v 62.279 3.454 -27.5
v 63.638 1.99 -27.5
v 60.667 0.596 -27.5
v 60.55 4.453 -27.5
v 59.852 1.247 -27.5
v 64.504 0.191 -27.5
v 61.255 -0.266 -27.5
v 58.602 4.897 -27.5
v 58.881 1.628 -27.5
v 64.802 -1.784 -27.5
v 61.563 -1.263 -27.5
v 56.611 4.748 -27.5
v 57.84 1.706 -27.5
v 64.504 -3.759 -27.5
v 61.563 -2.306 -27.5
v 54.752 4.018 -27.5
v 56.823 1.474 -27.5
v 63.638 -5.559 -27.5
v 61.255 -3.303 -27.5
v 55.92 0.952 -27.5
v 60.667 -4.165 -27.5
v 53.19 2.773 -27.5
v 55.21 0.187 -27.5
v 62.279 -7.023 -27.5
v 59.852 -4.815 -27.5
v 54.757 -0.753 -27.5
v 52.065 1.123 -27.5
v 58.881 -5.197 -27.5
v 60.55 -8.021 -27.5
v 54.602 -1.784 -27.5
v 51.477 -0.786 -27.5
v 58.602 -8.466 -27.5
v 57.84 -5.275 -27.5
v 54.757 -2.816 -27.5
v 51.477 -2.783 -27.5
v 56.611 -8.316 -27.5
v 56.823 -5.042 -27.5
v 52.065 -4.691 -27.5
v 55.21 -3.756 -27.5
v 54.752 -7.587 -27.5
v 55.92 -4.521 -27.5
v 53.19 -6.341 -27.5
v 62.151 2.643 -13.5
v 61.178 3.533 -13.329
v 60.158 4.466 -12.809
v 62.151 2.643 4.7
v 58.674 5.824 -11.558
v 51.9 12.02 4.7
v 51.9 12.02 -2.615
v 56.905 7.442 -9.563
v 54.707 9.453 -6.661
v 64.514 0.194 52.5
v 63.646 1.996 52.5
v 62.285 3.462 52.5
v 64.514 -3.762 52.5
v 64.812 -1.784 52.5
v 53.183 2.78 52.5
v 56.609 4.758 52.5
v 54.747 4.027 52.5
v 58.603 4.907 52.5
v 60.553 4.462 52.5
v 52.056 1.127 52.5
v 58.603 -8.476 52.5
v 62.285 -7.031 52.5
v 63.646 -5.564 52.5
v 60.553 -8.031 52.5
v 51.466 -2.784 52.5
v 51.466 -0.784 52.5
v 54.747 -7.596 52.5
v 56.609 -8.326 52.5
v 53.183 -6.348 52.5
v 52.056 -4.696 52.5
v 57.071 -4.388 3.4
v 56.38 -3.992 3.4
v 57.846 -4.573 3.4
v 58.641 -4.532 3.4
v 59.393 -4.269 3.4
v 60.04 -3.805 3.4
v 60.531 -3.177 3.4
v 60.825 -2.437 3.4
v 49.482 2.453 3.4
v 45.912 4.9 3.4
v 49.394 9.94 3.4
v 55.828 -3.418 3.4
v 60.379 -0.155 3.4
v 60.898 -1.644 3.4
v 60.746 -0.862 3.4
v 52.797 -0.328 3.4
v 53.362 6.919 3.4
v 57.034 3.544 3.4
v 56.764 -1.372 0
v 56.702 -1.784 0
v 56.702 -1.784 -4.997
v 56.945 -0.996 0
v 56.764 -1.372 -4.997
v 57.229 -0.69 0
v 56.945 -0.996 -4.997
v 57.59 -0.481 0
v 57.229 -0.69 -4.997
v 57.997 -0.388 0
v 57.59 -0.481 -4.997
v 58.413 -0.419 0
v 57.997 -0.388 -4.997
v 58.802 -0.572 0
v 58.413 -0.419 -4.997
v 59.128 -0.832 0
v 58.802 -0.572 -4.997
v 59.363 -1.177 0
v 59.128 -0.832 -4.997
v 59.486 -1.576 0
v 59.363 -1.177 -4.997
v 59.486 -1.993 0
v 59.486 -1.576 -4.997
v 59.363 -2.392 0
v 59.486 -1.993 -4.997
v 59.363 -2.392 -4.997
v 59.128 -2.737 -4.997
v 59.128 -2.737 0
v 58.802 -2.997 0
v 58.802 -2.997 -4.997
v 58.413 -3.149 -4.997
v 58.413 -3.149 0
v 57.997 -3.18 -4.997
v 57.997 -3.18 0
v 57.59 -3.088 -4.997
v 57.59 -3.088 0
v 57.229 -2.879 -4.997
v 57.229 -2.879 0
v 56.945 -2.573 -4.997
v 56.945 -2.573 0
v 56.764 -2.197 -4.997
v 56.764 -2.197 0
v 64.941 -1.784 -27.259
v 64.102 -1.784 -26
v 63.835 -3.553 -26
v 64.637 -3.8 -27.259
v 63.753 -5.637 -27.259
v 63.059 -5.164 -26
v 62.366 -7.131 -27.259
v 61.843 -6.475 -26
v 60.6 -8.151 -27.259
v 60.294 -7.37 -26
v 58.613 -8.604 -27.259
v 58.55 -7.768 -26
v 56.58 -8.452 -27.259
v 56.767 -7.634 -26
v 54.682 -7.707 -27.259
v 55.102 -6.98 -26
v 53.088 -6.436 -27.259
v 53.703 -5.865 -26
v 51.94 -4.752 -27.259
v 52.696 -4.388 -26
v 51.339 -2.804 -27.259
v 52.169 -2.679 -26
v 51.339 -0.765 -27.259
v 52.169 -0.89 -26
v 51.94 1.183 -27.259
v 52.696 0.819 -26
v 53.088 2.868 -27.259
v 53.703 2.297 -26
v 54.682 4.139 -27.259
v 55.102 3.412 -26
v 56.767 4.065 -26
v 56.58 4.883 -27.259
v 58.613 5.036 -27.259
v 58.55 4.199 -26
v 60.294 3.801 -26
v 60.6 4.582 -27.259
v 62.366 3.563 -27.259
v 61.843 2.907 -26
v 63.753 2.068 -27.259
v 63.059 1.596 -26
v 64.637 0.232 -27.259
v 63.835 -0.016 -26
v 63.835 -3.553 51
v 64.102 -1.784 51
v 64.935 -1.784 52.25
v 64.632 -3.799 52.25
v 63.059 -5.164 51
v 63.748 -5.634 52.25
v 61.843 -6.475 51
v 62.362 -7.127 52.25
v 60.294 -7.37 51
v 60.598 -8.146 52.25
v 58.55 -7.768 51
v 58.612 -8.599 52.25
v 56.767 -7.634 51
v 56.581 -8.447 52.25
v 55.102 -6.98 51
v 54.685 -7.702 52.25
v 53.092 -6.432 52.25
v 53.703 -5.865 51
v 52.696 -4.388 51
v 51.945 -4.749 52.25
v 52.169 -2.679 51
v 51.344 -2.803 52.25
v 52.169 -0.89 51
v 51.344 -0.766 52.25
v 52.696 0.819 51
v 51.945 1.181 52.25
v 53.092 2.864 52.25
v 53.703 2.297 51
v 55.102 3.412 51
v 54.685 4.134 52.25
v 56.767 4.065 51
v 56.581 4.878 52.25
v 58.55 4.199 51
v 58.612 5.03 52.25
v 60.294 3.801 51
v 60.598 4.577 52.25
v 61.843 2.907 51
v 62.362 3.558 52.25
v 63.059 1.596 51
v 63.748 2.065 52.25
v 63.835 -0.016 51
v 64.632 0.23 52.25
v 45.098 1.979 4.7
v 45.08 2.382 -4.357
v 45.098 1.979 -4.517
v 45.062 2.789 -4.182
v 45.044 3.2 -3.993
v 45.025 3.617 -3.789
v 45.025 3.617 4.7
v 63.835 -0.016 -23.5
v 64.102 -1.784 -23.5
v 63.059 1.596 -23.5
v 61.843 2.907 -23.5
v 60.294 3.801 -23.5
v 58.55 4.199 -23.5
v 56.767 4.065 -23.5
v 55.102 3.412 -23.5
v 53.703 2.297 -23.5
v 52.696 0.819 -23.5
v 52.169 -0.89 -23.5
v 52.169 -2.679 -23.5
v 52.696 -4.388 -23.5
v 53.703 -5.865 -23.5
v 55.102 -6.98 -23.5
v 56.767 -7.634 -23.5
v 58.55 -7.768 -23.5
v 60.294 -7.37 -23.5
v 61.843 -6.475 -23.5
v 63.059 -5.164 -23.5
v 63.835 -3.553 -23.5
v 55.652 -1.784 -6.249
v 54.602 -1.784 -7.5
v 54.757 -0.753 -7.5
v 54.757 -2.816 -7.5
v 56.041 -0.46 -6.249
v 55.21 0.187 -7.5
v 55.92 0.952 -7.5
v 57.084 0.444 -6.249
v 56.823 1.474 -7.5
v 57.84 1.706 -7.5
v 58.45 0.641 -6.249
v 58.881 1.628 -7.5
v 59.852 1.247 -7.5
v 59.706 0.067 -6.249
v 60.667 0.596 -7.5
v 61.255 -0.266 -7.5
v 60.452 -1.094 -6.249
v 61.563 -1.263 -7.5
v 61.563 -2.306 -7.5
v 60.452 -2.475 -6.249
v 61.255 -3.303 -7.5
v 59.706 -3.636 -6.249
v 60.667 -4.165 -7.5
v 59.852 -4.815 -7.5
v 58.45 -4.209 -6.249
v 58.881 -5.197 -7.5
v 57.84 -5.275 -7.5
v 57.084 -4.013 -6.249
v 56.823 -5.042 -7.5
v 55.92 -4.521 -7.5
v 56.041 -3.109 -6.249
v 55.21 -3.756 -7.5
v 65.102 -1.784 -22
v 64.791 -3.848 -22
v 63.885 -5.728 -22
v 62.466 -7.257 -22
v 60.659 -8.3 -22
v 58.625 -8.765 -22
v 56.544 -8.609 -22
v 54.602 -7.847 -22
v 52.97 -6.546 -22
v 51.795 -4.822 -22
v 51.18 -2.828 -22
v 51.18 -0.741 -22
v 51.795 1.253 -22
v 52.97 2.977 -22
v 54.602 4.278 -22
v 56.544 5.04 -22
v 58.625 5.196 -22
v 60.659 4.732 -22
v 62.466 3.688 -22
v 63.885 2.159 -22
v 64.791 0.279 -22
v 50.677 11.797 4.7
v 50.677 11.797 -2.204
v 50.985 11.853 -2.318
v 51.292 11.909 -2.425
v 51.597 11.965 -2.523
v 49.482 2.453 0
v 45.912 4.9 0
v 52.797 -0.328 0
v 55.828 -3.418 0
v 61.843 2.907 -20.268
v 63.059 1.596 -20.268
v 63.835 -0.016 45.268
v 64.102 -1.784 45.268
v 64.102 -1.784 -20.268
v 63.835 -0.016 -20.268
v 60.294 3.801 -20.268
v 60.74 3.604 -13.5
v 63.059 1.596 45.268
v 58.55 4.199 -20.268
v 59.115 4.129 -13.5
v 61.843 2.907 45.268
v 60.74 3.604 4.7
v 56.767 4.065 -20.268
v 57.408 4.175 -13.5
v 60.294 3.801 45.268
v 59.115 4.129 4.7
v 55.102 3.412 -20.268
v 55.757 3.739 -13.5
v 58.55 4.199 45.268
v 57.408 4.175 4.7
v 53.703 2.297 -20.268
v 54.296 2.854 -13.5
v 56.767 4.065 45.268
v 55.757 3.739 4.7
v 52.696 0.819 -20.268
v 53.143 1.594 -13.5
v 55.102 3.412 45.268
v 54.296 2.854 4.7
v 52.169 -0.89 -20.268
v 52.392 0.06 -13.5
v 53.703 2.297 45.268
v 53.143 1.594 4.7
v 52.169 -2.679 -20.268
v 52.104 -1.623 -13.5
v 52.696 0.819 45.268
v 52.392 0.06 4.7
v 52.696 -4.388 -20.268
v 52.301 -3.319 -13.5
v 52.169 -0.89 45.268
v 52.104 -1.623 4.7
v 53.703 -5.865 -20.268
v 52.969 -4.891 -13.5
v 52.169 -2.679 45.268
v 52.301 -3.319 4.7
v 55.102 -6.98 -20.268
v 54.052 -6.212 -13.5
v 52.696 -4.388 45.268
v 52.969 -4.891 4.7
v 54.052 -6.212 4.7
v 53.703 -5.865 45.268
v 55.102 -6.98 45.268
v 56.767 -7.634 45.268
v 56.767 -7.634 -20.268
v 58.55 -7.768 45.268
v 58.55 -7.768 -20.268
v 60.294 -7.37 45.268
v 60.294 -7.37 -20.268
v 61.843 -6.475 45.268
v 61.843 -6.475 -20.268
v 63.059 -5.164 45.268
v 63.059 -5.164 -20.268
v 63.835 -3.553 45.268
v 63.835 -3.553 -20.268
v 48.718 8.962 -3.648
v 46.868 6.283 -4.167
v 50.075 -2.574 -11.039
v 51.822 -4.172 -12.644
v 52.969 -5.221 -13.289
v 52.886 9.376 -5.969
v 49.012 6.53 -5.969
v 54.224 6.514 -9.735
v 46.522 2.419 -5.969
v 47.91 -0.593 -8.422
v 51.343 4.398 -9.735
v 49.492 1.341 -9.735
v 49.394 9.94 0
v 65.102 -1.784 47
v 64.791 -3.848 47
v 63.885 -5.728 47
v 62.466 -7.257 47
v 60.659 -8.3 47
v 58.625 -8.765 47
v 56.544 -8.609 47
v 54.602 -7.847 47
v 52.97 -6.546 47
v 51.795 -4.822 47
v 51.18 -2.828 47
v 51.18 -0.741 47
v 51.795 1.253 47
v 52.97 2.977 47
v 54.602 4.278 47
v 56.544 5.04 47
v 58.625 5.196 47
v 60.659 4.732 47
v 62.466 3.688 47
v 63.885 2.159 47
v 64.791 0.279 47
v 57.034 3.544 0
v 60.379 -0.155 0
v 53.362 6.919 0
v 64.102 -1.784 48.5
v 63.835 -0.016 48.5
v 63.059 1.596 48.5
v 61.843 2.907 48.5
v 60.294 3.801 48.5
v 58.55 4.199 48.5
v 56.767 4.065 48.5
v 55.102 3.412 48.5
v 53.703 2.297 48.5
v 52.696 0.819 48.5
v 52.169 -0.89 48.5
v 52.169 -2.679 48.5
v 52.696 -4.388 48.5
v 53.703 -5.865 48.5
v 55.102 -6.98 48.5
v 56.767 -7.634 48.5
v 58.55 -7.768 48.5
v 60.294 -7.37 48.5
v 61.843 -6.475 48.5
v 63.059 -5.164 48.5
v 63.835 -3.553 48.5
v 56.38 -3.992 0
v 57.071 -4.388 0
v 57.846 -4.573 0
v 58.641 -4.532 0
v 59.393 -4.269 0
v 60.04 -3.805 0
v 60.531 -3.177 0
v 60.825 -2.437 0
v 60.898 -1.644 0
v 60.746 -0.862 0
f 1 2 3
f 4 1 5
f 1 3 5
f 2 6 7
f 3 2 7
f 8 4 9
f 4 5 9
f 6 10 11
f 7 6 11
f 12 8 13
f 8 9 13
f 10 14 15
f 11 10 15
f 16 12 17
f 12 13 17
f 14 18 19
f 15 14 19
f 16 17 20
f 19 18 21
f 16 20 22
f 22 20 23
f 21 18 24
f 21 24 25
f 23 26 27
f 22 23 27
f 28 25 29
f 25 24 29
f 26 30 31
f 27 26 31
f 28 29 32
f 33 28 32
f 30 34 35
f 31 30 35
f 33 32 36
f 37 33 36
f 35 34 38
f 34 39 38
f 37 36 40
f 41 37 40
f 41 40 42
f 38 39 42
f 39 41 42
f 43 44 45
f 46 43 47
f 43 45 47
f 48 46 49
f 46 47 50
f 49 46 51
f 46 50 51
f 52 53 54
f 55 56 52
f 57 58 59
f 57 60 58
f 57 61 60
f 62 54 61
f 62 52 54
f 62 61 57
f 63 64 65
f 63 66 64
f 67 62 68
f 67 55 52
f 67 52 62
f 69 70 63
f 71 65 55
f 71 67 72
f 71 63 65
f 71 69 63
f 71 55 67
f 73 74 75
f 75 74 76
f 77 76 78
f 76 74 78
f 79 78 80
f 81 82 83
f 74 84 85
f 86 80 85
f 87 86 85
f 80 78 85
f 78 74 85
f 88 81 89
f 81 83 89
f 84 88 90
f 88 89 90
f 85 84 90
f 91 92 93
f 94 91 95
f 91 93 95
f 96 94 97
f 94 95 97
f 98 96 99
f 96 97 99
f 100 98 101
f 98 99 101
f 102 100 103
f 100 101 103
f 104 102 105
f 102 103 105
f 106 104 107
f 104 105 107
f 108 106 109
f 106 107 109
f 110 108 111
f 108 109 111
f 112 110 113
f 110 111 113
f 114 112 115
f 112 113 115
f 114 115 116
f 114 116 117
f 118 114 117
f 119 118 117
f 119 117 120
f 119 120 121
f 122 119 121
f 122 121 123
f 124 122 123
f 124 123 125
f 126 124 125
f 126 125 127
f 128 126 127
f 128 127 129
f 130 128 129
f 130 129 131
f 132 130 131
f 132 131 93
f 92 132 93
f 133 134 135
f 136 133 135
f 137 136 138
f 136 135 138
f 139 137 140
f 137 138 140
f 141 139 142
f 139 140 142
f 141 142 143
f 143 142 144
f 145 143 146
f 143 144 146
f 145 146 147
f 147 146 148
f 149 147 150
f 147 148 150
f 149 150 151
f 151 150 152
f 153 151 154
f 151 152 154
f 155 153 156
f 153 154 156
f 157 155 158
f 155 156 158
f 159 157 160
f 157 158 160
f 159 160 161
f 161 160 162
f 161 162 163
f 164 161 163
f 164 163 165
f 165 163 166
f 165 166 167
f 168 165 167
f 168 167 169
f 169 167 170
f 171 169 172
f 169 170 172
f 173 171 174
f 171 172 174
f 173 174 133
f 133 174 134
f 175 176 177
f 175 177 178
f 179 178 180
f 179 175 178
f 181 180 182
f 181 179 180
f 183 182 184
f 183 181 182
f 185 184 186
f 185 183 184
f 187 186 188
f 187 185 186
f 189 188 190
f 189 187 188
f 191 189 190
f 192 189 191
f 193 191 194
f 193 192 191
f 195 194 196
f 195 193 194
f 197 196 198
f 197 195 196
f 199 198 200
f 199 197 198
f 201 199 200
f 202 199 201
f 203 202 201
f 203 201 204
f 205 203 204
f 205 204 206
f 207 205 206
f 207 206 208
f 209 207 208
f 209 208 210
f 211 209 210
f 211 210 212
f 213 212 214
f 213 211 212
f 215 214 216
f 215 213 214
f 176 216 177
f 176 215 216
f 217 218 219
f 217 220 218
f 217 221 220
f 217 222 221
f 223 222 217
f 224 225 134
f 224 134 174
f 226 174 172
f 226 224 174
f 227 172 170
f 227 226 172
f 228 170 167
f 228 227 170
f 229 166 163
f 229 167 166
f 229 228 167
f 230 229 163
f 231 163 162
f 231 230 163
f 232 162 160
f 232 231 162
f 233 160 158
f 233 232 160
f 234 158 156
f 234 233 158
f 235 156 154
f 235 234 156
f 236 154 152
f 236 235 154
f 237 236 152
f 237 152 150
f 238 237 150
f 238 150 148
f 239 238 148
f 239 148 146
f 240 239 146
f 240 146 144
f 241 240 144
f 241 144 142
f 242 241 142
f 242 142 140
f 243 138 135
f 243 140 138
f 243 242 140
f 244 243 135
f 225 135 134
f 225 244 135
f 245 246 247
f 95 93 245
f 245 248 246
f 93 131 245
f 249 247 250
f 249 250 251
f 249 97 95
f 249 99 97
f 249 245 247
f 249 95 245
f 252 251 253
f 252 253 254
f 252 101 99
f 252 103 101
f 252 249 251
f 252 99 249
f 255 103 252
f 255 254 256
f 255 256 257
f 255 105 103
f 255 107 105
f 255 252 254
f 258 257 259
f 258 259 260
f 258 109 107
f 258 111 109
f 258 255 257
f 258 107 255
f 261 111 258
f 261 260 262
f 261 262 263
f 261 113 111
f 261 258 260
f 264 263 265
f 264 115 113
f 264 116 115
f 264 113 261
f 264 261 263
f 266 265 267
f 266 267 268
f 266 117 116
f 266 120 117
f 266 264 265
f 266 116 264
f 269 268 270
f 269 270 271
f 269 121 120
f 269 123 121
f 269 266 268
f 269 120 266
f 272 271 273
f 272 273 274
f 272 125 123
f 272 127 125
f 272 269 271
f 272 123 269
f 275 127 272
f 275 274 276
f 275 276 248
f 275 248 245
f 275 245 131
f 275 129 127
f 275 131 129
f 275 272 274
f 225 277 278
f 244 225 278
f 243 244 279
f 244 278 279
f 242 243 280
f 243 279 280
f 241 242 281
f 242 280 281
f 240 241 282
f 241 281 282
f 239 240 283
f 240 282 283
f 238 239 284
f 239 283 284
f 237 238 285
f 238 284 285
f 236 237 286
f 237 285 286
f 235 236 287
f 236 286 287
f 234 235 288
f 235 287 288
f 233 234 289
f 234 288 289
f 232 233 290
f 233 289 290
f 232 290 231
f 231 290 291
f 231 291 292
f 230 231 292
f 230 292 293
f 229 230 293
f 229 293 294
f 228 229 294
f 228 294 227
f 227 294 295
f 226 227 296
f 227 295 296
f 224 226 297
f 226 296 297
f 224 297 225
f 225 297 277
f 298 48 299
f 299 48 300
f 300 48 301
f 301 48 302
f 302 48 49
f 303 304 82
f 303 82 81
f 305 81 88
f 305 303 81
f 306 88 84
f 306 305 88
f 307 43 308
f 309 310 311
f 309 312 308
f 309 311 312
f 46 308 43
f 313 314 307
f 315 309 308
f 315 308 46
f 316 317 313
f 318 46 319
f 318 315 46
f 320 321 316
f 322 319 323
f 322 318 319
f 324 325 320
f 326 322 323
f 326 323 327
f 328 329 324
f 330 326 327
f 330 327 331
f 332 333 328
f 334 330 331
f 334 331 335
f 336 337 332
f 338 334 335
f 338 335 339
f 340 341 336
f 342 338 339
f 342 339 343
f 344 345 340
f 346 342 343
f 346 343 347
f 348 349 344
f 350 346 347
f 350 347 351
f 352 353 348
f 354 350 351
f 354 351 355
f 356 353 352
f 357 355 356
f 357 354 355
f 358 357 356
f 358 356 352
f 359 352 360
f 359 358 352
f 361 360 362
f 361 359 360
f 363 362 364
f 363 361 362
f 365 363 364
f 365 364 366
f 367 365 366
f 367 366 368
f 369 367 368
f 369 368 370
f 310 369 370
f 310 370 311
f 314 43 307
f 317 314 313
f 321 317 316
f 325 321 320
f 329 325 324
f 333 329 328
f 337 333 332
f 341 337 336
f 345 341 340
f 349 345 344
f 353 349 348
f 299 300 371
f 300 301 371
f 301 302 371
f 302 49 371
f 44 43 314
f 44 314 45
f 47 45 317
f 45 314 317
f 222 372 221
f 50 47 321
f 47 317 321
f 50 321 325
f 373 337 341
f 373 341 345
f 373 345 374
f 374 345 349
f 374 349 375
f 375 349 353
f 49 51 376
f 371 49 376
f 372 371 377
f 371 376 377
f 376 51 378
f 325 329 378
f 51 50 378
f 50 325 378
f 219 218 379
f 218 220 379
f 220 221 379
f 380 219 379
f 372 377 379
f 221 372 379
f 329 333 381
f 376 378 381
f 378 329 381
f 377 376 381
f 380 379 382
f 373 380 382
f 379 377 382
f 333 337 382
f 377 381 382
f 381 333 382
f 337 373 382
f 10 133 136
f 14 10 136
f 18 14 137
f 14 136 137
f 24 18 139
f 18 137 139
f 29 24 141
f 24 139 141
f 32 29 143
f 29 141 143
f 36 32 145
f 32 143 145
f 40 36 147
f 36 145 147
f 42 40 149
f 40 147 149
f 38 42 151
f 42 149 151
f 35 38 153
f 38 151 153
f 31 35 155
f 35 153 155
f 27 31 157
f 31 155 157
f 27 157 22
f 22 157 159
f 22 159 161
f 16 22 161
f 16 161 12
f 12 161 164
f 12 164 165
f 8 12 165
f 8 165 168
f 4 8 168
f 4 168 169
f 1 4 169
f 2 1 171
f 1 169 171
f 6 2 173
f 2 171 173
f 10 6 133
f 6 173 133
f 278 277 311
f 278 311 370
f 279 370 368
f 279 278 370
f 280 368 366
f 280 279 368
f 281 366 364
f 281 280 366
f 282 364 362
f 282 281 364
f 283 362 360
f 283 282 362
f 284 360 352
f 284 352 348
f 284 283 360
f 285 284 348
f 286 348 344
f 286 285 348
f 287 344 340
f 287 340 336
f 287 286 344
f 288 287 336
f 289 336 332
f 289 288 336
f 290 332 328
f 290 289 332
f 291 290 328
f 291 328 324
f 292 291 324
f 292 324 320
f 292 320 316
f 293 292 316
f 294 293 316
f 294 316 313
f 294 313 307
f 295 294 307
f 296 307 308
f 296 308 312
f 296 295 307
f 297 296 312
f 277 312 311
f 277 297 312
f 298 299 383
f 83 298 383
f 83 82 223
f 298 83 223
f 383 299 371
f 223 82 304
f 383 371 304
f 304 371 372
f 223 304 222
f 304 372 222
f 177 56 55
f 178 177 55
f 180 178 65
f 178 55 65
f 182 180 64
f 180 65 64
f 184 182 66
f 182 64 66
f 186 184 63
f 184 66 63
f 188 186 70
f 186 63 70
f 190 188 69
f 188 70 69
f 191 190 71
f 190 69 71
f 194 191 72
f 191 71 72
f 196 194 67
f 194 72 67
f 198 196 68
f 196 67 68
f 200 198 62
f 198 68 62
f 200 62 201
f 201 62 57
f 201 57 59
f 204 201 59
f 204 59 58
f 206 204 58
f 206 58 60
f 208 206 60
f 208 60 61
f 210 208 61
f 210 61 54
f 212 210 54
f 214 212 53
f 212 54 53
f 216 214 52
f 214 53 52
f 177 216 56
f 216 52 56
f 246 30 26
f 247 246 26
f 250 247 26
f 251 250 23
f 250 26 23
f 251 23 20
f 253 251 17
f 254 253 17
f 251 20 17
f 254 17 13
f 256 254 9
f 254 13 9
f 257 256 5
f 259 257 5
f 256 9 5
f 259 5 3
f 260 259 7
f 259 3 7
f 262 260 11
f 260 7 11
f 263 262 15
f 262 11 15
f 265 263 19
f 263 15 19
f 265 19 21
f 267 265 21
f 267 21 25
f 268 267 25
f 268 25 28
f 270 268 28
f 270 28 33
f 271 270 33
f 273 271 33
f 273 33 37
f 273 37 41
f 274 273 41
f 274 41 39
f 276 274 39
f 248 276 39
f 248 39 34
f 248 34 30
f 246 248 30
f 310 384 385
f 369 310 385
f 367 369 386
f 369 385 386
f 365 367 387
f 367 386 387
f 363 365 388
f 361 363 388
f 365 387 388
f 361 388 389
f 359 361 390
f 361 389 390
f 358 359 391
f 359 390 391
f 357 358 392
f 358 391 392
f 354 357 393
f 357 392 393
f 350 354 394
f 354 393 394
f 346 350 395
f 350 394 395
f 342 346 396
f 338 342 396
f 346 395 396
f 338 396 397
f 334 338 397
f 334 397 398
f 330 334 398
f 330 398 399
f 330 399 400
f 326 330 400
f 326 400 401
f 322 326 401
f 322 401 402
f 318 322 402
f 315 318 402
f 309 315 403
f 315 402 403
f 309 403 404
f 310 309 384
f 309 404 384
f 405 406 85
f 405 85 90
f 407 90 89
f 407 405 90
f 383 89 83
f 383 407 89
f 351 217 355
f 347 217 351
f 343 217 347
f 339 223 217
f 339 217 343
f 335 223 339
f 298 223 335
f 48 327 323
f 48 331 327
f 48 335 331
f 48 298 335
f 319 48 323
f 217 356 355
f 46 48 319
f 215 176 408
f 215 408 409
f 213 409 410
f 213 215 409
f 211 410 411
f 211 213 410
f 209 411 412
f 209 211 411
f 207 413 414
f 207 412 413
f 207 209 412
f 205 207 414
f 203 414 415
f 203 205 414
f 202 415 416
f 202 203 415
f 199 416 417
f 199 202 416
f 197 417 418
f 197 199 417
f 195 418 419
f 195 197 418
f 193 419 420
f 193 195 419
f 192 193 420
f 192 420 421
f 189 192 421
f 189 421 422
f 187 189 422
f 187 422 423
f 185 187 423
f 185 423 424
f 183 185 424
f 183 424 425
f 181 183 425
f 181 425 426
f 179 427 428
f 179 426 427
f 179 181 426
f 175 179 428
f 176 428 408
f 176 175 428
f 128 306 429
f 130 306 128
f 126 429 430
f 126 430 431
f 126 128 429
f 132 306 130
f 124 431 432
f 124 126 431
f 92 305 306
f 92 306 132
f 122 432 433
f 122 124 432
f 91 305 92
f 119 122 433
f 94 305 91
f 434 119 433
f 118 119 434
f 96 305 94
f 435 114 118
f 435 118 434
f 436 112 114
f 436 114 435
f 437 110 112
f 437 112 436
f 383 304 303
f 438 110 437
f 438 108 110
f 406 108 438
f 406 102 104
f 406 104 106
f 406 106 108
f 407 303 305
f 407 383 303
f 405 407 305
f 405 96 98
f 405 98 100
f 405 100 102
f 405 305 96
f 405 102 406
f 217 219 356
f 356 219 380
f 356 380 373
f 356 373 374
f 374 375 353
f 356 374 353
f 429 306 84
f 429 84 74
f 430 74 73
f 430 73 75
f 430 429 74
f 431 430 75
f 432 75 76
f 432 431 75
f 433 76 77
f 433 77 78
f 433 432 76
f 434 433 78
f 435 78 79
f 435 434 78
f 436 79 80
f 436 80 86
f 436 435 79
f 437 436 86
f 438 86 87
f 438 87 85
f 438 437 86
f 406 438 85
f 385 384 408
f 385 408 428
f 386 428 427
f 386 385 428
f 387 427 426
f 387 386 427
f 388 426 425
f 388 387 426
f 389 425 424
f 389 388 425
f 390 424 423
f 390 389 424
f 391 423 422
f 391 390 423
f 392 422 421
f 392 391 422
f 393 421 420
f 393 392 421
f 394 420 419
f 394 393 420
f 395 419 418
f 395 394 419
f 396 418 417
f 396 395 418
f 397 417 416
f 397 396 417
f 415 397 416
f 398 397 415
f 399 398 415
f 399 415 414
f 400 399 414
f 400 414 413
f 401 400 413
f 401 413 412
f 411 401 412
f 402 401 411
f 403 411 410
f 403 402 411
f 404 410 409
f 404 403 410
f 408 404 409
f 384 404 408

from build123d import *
from OCP.BRepFilletAPI import BRepFilletAPI_MakeChamfer

# Parameters (mm, degrees)
BOSS_EXTRUDE1_DEPTH      = 3
SKETCH4_R                = 6
BOSS_EXTRUDE2_DEPTH      = 40
BOSS_EXTRUDE3_DEPTH      = 4.7
BOSS_EXTRUDE3_DEPTH_BACK = 1.5
CHAMFER1_START           = -13.500000159
CHAMFER1_DEPTH           = 12.000000159
CHAMFER1_2_ANGLE         = 180
CUT_EXTRUDE1_DEPTH       = 3.4
SKETCH9_R                = 1.4
CUT_EXTRUDE2_DEPTH       = 27.5
SKETCH10_R               = 3.5
CUT_EXTRUDE3_DEPTH       = 23
CHAMFER2_SIZE            = 3
CHAMFER2_SIZE_2          = 2.517298894
CHAMFER3_SIZE            = 1
CHAMFER3_SIZE2           = 1.169832114
CHAMFER3_SIZE2_2         = 0.887609284
CHAMFER4_SIZE            = 1.732050808
CHAMFER4_SIZE_2          = 1
CHAMFER5_SIZE            = 0.3
CHAMFER5_SIZE2           = 0.289831366


with BuildPart() as part:
    # Sketch3 → Boss-Extrude1 (new body)
    with BuildSketch(Plane.XY):
        with BuildLine():
            ThreePointArc((-21.06925633, 1.560185503), (-21.702383426, -4.120337722), (-16.861546239, -7.159332517))
            Line((-16.861546239, -7.159332517), (-16.235942246, -7.122800897))
            ThreePointArc((-16.235942246, -7.122800897), (-14.247317716, -6.480760333), (-12.653836147, -5.128850538))
            ThreePointArc((-12.653836147, -5.128850538), (21.262556938, 11.81913919), (56.062735888, -3.230898045))
            ThreePointArc((56.062735888, -3.230898045), (59.548283557, -3.823314658), (60.140700171, -0.337766989))
            ThreePointArc((60.140700171, -0.337766989), (19.96998669, 19.192613792), (-21.06925633, 1.560185503))
        make_face()
        Polygon((-14.842971244, -1.436629161), (-14.495267888, -1.784332517), (-14.848821278, -2.137885908), (-14.637840313, -2.550832882), (-15.083092963, -2.778319315), (-15.00954079, -3.236171091), (-15.503211236, -3.315477399), (-15.574237606, -3.773727796), (-16.068337858, -3.697144889), (-16.277038544, -4.111248976), (-16.723538831, -3.886221213), (-17.049626765, -4.215925369), (-17.405124343, -3.864326917), (-17.816901648, -4.077581746), (-18.046839834, -3.633590269), (-18.504279068, -3.70966601), (-18.586306367, -3.21644038), (-19.04494145, -3.147941973), (-18.971084274, -2.65342694), (-19.386332882, -2.447012878), (-19.163770631, -1.999278532), (-19.495267888, -1.67501361), (-19.145635065, -1.317582653), (-19.361157273, -0.906987537), (-18.918440472, -0.674604591), (-18.997037466, -0.217591808), (-18.504271649, -0.132846012), (-18.438303288, 0.326159812), (-17.94338851, 0.255030612), (-17.73926735, 0.671411115), (-17.290312559, 0.451321143), (-16.967880508, 0.784601421), (-16.60852704, 0.436944858), (-16.199126599, 0.654727893), (-15.964305958, 0.213299227), (-15.507733522, 0.294415085), (-15.420271807, -0.197875935), (-14.960909199, -0.261312244), (-15.029308259, -0.756611718), (-14.611808522, -0.958433771), align=None, mode=Mode.SUBTRACT)
    extrude(amount=BOSS_EXTRUDE1_DEPTH)


with BuildPart() as body_2:
    # Sketch4 → Boss-Extrude2 (new, symmetric)
    with BuildSketch(Plane.XY.offset(12.5)):
        with Locations((58.101718029, -1.784332517)):
            Circle(SKETCH4_R)
    extrude(amount=BOSS_EXTRUDE2_DEPTH, both=True)

    # Sketch8 → Boss-Extrude3 (add, two sides: drawn at the far end of the back side and taken through both)
    with BuildSketch(Plane.XY.offset(-BOSS_EXTRUDE3_DEPTH_BACK)):
        with BuildLine():
            Line((62.151425867, 2.642841122), (51.244940369, 12.619427404))
            Line((51.244940369, 12.619427404), (44.360090975, 2.654069132))
            Line((44.360090975, 2.654069132), (54.052010192, -6.211506156))
            ThreePointArc((54.052010192, -6.211506156), (62.528891669, -5.834040354), (62.151425867, 2.642841122))
        make_face()
    extrude(amount=BOSS_EXTRUDE3_DEPTH + BOSS_EXTRUDE3_DEPTH_BACK)

    # Chamfer1: read off the stored shape, not the designer's step
    # Chamfer1 outline → Chamfer1 (add)
    with BuildSketch(Plane.XY.offset(CHAMFER1_START)):
        with BuildLine():
            Line((51.244940369, 12.619427404), (44.360090975, 2.654069132))
            Line((44.360090975, 2.654069132), (54.052010192, -6.211506156))
            ThreePointArc((54.052010192, -6.211506156), (53.67454439, 2.265375321), (62.151425867, 2.642841122))
            Line((62.151425867, 2.642841122), (51.244940369, 12.619427404))
        make_face()
    extrude(amount=CHAMFER1_DEPTH)

    # Chamfer1 2 outline → Chamfer1 2 (revolve, cut)
    with BuildSketch(Plane(origin=(58.101718029, -1.784332517, 0), x_dir=(0.6749513062060508, 0.7378622732263427, 0), z_dir=(0.7378622732263427, -0.6749513062060508, 0))):
        Polygon((15.952545244, -1.63901845), (5.999993338, -13.500007939), (15.952545243, -13.500000159), align=None)
    revolve(axis=Axis((58.101718029, -1.784332517, 0), (0, 0, 1)), revolution_arc=CHAMFER1_2_ANGLE, mode=Mode.SUBTRACT)

    # Sketch6 → Cut-Extrude1 (cut)
    with BuildSketch(Plane.XY):
        with BuildLine():
            Line((-16.85267585, -7.459325585), (-16.209835721, -7.421787475))
            ThreePointArc((-16.209835721, -7.421787475), (-14.1052834, -6.74504216), (-12.418987212, -5.315521311))
            ThreePointArc((-12.418987212, -5.315521311), (21.262849062, 11.519032134), (55.827922983, -3.418301943))
            ThreePointArc((55.827922983, -3.418301943), (59.733301775, -4.059840039), (60.378935523, -0.155136246))
            ThreePointArc((60.378935523, -0.155136246), (19.977496019, 19.492520208), (-21.298028536, 1.754487883))
            ThreePointArc((-21.298028536, 1.754487883), (-21.97276199, -4.250320867), (-16.85267585, -7.459325585))
        make_face()
    extrude(amount=CUT_EXTRUDE1_DEPTH, mode=Mode.SUBTRACT)

    # Sketch9 → Cut-Extrude2 (cut)
    with BuildSketch(Plane(origin=(0, 0, -27.5), x_dir=(-1, 0, 0), z_dir=(0, 0, -1))):
        with Locations((-58.101718029, -1.784332517)):
            Circle(SKETCH9_R)
    extrude(amount=-CUT_EXTRUDE2_DEPTH, mode=Mode.SUBTRACT)

    # Sketch10 → Cut-Extrude3 (cut)
    with BuildSketch(Plane(origin=(0, 0, -27.5), x_dir=(-1, 0, 0), z_dir=(0, 0, -1))):
        with Locations((-58.101718029, -1.784332517)):
            Circle(SKETCH10_R)
    extrude(amount=-CUT_EXTRUDE3_DEPTH, mode=Mode.SUBTRACT)

    # Chamfer2
    # the kernel refuses this chamfer: 3, 2.517298894 mm, written as the material it adds along each edge
    with BuildSketch(Plane(origin=(58.101718029, -1.784332517, -4.5), x_dir=(-1, 0, 0), z_dir=(0, -1, 0))) as chamfer2_piece_1_section:
        Polygon((3.5, CHAMFER2_SIZE), (3.5 - CHAMFER2_SIZE_2, 0), (3.5, 0), align=None)
    chamfer2_piece_1 = revolve(axis=Axis((58.101718029, -1.784332517, -4.5), (0, 0, -1)), mode=Mode.PRIVATE)
    chamfer2_piece_1 = chamfer2_piece_1 - Plane(origin=(58.101718029, -1.784332517, -4.5), x_dir=(-1, 0, 0), z_dir=(0, 0, -1)) * Cylinder(1.4, 14, mode=Mode.PRIVATE)
    add(chamfer2_piece_1)

    # Sketch11 → Revolve1 (revolve)
    with BuildSketch(Plane(origin=(58.101718029, 0, 0), x_dir=(0, 0, -1), z_dir=(1, 0, 0)), mode=Mode.PRIVATE) as revolve1_sk:
        Polygon((27.5, -7.784332517), (27.5, -8.784332517), (26, -7.784332517), align=None)
        Polygon((23.5, -7.784332517), (22, -8.784332517), (22, -7.784332517), align=None)
    revolve1 = revolve(revolve1_sk.sketch.rotate(Axis((58.101718029, -1.784332517, 52.5), (0, 0, -1)), 270), axis=Axis((58.101718029, -1.784332517, 52.5), (0, 0, -1)))

    # Mirror1: Revolve1 across plane
    add(revolve1.mirror(Plane.XY.offset(12.5)))

    # Chamfer3: one chamfer whose edges measure the first distance from different faces: ONE call of the kernel's chamfer builder (chamfer() names one face for all edges)
    chamfer3_edges_1 = [body_2.edges().sort_by_distance(p)[0] for p in [
        (44.360090975, 2.654069132, 1.6),
    ]]
    chamfer3_side_1 = [body_2.faces().sort_by_distance(p)[0] for p in [
        (49.206050583, -1.778718512, 1.6),
    ]]
    chamfer3_edges_2 = [body_2.edges().sort_by_distance(p)[0] for p in [
        (51.244940369, 12.619427404, 1.6),
    ]]
    chamfer3_side_2 = [body_2.faces().sort_by_distance(p)[0] for p in [
        (47.802515672, 7.636748268, 4.563930343),
    ]]
    chamfer3 = BRepFilletAPI_MakeChamfer(body_2.part.solid().wrapped)
    for e in chamfer3_edges_1:
        chamfer3.Add(CHAMFER3_SIZE, CHAMFER3_SIZE2, e.wrapped, chamfer3_side_1[0].wrapped)  # the first distance lies on this face
    for e in chamfer3_edges_2:
        chamfer3.Add(CHAMFER3_SIZE, CHAMFER3_SIZE2_2, e.wrapped, chamfer3_side_2[0].wrapped)  # the first distance lies on this face
    add(Compound.cast(chamfer3.Shape()), mode=Mode.REPLACE)

    # Chamfer4
    # the kernel refuses this chamfer: 1.732050808, 1 mm, written as the material it adds along each edge
    with BuildSketch(Plane(origin=(58.101718029, -1.784332517, -22), x_dir=(1, 0, 0), z_dir=(0, 1, 0))) as chamfer4_piece_1:
        Polygon((6, -CHAMFER4_SIZE), (6 + CHAMFER4_SIZE_2, 0), (6, 0), align=None)
    revolve(axis=Axis((58.101718029, -1.784332517, -22), (0, 0, -1)))
    with BuildSketch(Plane(origin=(58.101718029, -1.784332517, 47), x_dir=(1, 0, 0), z_dir=(0, 1, 0))) as chamfer4_piece_2:
        Polygon((6, CHAMFER4_SIZE), (6 + CHAMFER4_SIZE_2, 0), (6, 0), align=None)
    revolve(axis=Axis((58.101718029, -1.784332517, 47), (0, 0, -1)))

    # Chamfer5: one chamfer whose edges measure the first distance from different faces: ONE call of the kernel's chamfer builder (chamfer() names one face for all edges)
    chamfer5_edges_1 = [body_2.edges().sort_by_distance(p)[0] for p in [
        (51.101718029, -1.784332517, -27.5),
    ]]
    chamfer5_side_1 = [body_2.faces().sort_by_distance(p)[0] for p in [
        (61.799707928, -1.784332517, -27.5),
    ]]
    chamfer5_edges_2 = [body_2.edges().sort_by_distance(p)[0] for p in [
        (51.101718029, -1.784332517, 52.5),
    ]]
    chamfer5_side_2 = [body_2.faces().sort_by_distance(p)[0] for p in [
        (51.601718029, -1.784332517, 51.75),
    ]]
    chamfer5 = BRepFilletAPI_MakeChamfer(body_2.part.solid().wrapped)
    for e in chamfer5_edges_1:
        chamfer5.Add(CHAMFER5_SIZE, CHAMFER5_SIZE2, e.wrapped, chamfer5_side_1[0].wrapped)  # the first distance lies on this face
    for e in chamfer5_edges_2:
        chamfer5.Add(CHAMFER5_SIZE, CHAMFER5_SIZE2, e.wrapped, chamfer5_side_2[0].wrapped)  # the first distance lies on this face
    add(Compound.cast(chamfer5.Shape()), mode=Mode.REPLACE)


solid = body_2.part
